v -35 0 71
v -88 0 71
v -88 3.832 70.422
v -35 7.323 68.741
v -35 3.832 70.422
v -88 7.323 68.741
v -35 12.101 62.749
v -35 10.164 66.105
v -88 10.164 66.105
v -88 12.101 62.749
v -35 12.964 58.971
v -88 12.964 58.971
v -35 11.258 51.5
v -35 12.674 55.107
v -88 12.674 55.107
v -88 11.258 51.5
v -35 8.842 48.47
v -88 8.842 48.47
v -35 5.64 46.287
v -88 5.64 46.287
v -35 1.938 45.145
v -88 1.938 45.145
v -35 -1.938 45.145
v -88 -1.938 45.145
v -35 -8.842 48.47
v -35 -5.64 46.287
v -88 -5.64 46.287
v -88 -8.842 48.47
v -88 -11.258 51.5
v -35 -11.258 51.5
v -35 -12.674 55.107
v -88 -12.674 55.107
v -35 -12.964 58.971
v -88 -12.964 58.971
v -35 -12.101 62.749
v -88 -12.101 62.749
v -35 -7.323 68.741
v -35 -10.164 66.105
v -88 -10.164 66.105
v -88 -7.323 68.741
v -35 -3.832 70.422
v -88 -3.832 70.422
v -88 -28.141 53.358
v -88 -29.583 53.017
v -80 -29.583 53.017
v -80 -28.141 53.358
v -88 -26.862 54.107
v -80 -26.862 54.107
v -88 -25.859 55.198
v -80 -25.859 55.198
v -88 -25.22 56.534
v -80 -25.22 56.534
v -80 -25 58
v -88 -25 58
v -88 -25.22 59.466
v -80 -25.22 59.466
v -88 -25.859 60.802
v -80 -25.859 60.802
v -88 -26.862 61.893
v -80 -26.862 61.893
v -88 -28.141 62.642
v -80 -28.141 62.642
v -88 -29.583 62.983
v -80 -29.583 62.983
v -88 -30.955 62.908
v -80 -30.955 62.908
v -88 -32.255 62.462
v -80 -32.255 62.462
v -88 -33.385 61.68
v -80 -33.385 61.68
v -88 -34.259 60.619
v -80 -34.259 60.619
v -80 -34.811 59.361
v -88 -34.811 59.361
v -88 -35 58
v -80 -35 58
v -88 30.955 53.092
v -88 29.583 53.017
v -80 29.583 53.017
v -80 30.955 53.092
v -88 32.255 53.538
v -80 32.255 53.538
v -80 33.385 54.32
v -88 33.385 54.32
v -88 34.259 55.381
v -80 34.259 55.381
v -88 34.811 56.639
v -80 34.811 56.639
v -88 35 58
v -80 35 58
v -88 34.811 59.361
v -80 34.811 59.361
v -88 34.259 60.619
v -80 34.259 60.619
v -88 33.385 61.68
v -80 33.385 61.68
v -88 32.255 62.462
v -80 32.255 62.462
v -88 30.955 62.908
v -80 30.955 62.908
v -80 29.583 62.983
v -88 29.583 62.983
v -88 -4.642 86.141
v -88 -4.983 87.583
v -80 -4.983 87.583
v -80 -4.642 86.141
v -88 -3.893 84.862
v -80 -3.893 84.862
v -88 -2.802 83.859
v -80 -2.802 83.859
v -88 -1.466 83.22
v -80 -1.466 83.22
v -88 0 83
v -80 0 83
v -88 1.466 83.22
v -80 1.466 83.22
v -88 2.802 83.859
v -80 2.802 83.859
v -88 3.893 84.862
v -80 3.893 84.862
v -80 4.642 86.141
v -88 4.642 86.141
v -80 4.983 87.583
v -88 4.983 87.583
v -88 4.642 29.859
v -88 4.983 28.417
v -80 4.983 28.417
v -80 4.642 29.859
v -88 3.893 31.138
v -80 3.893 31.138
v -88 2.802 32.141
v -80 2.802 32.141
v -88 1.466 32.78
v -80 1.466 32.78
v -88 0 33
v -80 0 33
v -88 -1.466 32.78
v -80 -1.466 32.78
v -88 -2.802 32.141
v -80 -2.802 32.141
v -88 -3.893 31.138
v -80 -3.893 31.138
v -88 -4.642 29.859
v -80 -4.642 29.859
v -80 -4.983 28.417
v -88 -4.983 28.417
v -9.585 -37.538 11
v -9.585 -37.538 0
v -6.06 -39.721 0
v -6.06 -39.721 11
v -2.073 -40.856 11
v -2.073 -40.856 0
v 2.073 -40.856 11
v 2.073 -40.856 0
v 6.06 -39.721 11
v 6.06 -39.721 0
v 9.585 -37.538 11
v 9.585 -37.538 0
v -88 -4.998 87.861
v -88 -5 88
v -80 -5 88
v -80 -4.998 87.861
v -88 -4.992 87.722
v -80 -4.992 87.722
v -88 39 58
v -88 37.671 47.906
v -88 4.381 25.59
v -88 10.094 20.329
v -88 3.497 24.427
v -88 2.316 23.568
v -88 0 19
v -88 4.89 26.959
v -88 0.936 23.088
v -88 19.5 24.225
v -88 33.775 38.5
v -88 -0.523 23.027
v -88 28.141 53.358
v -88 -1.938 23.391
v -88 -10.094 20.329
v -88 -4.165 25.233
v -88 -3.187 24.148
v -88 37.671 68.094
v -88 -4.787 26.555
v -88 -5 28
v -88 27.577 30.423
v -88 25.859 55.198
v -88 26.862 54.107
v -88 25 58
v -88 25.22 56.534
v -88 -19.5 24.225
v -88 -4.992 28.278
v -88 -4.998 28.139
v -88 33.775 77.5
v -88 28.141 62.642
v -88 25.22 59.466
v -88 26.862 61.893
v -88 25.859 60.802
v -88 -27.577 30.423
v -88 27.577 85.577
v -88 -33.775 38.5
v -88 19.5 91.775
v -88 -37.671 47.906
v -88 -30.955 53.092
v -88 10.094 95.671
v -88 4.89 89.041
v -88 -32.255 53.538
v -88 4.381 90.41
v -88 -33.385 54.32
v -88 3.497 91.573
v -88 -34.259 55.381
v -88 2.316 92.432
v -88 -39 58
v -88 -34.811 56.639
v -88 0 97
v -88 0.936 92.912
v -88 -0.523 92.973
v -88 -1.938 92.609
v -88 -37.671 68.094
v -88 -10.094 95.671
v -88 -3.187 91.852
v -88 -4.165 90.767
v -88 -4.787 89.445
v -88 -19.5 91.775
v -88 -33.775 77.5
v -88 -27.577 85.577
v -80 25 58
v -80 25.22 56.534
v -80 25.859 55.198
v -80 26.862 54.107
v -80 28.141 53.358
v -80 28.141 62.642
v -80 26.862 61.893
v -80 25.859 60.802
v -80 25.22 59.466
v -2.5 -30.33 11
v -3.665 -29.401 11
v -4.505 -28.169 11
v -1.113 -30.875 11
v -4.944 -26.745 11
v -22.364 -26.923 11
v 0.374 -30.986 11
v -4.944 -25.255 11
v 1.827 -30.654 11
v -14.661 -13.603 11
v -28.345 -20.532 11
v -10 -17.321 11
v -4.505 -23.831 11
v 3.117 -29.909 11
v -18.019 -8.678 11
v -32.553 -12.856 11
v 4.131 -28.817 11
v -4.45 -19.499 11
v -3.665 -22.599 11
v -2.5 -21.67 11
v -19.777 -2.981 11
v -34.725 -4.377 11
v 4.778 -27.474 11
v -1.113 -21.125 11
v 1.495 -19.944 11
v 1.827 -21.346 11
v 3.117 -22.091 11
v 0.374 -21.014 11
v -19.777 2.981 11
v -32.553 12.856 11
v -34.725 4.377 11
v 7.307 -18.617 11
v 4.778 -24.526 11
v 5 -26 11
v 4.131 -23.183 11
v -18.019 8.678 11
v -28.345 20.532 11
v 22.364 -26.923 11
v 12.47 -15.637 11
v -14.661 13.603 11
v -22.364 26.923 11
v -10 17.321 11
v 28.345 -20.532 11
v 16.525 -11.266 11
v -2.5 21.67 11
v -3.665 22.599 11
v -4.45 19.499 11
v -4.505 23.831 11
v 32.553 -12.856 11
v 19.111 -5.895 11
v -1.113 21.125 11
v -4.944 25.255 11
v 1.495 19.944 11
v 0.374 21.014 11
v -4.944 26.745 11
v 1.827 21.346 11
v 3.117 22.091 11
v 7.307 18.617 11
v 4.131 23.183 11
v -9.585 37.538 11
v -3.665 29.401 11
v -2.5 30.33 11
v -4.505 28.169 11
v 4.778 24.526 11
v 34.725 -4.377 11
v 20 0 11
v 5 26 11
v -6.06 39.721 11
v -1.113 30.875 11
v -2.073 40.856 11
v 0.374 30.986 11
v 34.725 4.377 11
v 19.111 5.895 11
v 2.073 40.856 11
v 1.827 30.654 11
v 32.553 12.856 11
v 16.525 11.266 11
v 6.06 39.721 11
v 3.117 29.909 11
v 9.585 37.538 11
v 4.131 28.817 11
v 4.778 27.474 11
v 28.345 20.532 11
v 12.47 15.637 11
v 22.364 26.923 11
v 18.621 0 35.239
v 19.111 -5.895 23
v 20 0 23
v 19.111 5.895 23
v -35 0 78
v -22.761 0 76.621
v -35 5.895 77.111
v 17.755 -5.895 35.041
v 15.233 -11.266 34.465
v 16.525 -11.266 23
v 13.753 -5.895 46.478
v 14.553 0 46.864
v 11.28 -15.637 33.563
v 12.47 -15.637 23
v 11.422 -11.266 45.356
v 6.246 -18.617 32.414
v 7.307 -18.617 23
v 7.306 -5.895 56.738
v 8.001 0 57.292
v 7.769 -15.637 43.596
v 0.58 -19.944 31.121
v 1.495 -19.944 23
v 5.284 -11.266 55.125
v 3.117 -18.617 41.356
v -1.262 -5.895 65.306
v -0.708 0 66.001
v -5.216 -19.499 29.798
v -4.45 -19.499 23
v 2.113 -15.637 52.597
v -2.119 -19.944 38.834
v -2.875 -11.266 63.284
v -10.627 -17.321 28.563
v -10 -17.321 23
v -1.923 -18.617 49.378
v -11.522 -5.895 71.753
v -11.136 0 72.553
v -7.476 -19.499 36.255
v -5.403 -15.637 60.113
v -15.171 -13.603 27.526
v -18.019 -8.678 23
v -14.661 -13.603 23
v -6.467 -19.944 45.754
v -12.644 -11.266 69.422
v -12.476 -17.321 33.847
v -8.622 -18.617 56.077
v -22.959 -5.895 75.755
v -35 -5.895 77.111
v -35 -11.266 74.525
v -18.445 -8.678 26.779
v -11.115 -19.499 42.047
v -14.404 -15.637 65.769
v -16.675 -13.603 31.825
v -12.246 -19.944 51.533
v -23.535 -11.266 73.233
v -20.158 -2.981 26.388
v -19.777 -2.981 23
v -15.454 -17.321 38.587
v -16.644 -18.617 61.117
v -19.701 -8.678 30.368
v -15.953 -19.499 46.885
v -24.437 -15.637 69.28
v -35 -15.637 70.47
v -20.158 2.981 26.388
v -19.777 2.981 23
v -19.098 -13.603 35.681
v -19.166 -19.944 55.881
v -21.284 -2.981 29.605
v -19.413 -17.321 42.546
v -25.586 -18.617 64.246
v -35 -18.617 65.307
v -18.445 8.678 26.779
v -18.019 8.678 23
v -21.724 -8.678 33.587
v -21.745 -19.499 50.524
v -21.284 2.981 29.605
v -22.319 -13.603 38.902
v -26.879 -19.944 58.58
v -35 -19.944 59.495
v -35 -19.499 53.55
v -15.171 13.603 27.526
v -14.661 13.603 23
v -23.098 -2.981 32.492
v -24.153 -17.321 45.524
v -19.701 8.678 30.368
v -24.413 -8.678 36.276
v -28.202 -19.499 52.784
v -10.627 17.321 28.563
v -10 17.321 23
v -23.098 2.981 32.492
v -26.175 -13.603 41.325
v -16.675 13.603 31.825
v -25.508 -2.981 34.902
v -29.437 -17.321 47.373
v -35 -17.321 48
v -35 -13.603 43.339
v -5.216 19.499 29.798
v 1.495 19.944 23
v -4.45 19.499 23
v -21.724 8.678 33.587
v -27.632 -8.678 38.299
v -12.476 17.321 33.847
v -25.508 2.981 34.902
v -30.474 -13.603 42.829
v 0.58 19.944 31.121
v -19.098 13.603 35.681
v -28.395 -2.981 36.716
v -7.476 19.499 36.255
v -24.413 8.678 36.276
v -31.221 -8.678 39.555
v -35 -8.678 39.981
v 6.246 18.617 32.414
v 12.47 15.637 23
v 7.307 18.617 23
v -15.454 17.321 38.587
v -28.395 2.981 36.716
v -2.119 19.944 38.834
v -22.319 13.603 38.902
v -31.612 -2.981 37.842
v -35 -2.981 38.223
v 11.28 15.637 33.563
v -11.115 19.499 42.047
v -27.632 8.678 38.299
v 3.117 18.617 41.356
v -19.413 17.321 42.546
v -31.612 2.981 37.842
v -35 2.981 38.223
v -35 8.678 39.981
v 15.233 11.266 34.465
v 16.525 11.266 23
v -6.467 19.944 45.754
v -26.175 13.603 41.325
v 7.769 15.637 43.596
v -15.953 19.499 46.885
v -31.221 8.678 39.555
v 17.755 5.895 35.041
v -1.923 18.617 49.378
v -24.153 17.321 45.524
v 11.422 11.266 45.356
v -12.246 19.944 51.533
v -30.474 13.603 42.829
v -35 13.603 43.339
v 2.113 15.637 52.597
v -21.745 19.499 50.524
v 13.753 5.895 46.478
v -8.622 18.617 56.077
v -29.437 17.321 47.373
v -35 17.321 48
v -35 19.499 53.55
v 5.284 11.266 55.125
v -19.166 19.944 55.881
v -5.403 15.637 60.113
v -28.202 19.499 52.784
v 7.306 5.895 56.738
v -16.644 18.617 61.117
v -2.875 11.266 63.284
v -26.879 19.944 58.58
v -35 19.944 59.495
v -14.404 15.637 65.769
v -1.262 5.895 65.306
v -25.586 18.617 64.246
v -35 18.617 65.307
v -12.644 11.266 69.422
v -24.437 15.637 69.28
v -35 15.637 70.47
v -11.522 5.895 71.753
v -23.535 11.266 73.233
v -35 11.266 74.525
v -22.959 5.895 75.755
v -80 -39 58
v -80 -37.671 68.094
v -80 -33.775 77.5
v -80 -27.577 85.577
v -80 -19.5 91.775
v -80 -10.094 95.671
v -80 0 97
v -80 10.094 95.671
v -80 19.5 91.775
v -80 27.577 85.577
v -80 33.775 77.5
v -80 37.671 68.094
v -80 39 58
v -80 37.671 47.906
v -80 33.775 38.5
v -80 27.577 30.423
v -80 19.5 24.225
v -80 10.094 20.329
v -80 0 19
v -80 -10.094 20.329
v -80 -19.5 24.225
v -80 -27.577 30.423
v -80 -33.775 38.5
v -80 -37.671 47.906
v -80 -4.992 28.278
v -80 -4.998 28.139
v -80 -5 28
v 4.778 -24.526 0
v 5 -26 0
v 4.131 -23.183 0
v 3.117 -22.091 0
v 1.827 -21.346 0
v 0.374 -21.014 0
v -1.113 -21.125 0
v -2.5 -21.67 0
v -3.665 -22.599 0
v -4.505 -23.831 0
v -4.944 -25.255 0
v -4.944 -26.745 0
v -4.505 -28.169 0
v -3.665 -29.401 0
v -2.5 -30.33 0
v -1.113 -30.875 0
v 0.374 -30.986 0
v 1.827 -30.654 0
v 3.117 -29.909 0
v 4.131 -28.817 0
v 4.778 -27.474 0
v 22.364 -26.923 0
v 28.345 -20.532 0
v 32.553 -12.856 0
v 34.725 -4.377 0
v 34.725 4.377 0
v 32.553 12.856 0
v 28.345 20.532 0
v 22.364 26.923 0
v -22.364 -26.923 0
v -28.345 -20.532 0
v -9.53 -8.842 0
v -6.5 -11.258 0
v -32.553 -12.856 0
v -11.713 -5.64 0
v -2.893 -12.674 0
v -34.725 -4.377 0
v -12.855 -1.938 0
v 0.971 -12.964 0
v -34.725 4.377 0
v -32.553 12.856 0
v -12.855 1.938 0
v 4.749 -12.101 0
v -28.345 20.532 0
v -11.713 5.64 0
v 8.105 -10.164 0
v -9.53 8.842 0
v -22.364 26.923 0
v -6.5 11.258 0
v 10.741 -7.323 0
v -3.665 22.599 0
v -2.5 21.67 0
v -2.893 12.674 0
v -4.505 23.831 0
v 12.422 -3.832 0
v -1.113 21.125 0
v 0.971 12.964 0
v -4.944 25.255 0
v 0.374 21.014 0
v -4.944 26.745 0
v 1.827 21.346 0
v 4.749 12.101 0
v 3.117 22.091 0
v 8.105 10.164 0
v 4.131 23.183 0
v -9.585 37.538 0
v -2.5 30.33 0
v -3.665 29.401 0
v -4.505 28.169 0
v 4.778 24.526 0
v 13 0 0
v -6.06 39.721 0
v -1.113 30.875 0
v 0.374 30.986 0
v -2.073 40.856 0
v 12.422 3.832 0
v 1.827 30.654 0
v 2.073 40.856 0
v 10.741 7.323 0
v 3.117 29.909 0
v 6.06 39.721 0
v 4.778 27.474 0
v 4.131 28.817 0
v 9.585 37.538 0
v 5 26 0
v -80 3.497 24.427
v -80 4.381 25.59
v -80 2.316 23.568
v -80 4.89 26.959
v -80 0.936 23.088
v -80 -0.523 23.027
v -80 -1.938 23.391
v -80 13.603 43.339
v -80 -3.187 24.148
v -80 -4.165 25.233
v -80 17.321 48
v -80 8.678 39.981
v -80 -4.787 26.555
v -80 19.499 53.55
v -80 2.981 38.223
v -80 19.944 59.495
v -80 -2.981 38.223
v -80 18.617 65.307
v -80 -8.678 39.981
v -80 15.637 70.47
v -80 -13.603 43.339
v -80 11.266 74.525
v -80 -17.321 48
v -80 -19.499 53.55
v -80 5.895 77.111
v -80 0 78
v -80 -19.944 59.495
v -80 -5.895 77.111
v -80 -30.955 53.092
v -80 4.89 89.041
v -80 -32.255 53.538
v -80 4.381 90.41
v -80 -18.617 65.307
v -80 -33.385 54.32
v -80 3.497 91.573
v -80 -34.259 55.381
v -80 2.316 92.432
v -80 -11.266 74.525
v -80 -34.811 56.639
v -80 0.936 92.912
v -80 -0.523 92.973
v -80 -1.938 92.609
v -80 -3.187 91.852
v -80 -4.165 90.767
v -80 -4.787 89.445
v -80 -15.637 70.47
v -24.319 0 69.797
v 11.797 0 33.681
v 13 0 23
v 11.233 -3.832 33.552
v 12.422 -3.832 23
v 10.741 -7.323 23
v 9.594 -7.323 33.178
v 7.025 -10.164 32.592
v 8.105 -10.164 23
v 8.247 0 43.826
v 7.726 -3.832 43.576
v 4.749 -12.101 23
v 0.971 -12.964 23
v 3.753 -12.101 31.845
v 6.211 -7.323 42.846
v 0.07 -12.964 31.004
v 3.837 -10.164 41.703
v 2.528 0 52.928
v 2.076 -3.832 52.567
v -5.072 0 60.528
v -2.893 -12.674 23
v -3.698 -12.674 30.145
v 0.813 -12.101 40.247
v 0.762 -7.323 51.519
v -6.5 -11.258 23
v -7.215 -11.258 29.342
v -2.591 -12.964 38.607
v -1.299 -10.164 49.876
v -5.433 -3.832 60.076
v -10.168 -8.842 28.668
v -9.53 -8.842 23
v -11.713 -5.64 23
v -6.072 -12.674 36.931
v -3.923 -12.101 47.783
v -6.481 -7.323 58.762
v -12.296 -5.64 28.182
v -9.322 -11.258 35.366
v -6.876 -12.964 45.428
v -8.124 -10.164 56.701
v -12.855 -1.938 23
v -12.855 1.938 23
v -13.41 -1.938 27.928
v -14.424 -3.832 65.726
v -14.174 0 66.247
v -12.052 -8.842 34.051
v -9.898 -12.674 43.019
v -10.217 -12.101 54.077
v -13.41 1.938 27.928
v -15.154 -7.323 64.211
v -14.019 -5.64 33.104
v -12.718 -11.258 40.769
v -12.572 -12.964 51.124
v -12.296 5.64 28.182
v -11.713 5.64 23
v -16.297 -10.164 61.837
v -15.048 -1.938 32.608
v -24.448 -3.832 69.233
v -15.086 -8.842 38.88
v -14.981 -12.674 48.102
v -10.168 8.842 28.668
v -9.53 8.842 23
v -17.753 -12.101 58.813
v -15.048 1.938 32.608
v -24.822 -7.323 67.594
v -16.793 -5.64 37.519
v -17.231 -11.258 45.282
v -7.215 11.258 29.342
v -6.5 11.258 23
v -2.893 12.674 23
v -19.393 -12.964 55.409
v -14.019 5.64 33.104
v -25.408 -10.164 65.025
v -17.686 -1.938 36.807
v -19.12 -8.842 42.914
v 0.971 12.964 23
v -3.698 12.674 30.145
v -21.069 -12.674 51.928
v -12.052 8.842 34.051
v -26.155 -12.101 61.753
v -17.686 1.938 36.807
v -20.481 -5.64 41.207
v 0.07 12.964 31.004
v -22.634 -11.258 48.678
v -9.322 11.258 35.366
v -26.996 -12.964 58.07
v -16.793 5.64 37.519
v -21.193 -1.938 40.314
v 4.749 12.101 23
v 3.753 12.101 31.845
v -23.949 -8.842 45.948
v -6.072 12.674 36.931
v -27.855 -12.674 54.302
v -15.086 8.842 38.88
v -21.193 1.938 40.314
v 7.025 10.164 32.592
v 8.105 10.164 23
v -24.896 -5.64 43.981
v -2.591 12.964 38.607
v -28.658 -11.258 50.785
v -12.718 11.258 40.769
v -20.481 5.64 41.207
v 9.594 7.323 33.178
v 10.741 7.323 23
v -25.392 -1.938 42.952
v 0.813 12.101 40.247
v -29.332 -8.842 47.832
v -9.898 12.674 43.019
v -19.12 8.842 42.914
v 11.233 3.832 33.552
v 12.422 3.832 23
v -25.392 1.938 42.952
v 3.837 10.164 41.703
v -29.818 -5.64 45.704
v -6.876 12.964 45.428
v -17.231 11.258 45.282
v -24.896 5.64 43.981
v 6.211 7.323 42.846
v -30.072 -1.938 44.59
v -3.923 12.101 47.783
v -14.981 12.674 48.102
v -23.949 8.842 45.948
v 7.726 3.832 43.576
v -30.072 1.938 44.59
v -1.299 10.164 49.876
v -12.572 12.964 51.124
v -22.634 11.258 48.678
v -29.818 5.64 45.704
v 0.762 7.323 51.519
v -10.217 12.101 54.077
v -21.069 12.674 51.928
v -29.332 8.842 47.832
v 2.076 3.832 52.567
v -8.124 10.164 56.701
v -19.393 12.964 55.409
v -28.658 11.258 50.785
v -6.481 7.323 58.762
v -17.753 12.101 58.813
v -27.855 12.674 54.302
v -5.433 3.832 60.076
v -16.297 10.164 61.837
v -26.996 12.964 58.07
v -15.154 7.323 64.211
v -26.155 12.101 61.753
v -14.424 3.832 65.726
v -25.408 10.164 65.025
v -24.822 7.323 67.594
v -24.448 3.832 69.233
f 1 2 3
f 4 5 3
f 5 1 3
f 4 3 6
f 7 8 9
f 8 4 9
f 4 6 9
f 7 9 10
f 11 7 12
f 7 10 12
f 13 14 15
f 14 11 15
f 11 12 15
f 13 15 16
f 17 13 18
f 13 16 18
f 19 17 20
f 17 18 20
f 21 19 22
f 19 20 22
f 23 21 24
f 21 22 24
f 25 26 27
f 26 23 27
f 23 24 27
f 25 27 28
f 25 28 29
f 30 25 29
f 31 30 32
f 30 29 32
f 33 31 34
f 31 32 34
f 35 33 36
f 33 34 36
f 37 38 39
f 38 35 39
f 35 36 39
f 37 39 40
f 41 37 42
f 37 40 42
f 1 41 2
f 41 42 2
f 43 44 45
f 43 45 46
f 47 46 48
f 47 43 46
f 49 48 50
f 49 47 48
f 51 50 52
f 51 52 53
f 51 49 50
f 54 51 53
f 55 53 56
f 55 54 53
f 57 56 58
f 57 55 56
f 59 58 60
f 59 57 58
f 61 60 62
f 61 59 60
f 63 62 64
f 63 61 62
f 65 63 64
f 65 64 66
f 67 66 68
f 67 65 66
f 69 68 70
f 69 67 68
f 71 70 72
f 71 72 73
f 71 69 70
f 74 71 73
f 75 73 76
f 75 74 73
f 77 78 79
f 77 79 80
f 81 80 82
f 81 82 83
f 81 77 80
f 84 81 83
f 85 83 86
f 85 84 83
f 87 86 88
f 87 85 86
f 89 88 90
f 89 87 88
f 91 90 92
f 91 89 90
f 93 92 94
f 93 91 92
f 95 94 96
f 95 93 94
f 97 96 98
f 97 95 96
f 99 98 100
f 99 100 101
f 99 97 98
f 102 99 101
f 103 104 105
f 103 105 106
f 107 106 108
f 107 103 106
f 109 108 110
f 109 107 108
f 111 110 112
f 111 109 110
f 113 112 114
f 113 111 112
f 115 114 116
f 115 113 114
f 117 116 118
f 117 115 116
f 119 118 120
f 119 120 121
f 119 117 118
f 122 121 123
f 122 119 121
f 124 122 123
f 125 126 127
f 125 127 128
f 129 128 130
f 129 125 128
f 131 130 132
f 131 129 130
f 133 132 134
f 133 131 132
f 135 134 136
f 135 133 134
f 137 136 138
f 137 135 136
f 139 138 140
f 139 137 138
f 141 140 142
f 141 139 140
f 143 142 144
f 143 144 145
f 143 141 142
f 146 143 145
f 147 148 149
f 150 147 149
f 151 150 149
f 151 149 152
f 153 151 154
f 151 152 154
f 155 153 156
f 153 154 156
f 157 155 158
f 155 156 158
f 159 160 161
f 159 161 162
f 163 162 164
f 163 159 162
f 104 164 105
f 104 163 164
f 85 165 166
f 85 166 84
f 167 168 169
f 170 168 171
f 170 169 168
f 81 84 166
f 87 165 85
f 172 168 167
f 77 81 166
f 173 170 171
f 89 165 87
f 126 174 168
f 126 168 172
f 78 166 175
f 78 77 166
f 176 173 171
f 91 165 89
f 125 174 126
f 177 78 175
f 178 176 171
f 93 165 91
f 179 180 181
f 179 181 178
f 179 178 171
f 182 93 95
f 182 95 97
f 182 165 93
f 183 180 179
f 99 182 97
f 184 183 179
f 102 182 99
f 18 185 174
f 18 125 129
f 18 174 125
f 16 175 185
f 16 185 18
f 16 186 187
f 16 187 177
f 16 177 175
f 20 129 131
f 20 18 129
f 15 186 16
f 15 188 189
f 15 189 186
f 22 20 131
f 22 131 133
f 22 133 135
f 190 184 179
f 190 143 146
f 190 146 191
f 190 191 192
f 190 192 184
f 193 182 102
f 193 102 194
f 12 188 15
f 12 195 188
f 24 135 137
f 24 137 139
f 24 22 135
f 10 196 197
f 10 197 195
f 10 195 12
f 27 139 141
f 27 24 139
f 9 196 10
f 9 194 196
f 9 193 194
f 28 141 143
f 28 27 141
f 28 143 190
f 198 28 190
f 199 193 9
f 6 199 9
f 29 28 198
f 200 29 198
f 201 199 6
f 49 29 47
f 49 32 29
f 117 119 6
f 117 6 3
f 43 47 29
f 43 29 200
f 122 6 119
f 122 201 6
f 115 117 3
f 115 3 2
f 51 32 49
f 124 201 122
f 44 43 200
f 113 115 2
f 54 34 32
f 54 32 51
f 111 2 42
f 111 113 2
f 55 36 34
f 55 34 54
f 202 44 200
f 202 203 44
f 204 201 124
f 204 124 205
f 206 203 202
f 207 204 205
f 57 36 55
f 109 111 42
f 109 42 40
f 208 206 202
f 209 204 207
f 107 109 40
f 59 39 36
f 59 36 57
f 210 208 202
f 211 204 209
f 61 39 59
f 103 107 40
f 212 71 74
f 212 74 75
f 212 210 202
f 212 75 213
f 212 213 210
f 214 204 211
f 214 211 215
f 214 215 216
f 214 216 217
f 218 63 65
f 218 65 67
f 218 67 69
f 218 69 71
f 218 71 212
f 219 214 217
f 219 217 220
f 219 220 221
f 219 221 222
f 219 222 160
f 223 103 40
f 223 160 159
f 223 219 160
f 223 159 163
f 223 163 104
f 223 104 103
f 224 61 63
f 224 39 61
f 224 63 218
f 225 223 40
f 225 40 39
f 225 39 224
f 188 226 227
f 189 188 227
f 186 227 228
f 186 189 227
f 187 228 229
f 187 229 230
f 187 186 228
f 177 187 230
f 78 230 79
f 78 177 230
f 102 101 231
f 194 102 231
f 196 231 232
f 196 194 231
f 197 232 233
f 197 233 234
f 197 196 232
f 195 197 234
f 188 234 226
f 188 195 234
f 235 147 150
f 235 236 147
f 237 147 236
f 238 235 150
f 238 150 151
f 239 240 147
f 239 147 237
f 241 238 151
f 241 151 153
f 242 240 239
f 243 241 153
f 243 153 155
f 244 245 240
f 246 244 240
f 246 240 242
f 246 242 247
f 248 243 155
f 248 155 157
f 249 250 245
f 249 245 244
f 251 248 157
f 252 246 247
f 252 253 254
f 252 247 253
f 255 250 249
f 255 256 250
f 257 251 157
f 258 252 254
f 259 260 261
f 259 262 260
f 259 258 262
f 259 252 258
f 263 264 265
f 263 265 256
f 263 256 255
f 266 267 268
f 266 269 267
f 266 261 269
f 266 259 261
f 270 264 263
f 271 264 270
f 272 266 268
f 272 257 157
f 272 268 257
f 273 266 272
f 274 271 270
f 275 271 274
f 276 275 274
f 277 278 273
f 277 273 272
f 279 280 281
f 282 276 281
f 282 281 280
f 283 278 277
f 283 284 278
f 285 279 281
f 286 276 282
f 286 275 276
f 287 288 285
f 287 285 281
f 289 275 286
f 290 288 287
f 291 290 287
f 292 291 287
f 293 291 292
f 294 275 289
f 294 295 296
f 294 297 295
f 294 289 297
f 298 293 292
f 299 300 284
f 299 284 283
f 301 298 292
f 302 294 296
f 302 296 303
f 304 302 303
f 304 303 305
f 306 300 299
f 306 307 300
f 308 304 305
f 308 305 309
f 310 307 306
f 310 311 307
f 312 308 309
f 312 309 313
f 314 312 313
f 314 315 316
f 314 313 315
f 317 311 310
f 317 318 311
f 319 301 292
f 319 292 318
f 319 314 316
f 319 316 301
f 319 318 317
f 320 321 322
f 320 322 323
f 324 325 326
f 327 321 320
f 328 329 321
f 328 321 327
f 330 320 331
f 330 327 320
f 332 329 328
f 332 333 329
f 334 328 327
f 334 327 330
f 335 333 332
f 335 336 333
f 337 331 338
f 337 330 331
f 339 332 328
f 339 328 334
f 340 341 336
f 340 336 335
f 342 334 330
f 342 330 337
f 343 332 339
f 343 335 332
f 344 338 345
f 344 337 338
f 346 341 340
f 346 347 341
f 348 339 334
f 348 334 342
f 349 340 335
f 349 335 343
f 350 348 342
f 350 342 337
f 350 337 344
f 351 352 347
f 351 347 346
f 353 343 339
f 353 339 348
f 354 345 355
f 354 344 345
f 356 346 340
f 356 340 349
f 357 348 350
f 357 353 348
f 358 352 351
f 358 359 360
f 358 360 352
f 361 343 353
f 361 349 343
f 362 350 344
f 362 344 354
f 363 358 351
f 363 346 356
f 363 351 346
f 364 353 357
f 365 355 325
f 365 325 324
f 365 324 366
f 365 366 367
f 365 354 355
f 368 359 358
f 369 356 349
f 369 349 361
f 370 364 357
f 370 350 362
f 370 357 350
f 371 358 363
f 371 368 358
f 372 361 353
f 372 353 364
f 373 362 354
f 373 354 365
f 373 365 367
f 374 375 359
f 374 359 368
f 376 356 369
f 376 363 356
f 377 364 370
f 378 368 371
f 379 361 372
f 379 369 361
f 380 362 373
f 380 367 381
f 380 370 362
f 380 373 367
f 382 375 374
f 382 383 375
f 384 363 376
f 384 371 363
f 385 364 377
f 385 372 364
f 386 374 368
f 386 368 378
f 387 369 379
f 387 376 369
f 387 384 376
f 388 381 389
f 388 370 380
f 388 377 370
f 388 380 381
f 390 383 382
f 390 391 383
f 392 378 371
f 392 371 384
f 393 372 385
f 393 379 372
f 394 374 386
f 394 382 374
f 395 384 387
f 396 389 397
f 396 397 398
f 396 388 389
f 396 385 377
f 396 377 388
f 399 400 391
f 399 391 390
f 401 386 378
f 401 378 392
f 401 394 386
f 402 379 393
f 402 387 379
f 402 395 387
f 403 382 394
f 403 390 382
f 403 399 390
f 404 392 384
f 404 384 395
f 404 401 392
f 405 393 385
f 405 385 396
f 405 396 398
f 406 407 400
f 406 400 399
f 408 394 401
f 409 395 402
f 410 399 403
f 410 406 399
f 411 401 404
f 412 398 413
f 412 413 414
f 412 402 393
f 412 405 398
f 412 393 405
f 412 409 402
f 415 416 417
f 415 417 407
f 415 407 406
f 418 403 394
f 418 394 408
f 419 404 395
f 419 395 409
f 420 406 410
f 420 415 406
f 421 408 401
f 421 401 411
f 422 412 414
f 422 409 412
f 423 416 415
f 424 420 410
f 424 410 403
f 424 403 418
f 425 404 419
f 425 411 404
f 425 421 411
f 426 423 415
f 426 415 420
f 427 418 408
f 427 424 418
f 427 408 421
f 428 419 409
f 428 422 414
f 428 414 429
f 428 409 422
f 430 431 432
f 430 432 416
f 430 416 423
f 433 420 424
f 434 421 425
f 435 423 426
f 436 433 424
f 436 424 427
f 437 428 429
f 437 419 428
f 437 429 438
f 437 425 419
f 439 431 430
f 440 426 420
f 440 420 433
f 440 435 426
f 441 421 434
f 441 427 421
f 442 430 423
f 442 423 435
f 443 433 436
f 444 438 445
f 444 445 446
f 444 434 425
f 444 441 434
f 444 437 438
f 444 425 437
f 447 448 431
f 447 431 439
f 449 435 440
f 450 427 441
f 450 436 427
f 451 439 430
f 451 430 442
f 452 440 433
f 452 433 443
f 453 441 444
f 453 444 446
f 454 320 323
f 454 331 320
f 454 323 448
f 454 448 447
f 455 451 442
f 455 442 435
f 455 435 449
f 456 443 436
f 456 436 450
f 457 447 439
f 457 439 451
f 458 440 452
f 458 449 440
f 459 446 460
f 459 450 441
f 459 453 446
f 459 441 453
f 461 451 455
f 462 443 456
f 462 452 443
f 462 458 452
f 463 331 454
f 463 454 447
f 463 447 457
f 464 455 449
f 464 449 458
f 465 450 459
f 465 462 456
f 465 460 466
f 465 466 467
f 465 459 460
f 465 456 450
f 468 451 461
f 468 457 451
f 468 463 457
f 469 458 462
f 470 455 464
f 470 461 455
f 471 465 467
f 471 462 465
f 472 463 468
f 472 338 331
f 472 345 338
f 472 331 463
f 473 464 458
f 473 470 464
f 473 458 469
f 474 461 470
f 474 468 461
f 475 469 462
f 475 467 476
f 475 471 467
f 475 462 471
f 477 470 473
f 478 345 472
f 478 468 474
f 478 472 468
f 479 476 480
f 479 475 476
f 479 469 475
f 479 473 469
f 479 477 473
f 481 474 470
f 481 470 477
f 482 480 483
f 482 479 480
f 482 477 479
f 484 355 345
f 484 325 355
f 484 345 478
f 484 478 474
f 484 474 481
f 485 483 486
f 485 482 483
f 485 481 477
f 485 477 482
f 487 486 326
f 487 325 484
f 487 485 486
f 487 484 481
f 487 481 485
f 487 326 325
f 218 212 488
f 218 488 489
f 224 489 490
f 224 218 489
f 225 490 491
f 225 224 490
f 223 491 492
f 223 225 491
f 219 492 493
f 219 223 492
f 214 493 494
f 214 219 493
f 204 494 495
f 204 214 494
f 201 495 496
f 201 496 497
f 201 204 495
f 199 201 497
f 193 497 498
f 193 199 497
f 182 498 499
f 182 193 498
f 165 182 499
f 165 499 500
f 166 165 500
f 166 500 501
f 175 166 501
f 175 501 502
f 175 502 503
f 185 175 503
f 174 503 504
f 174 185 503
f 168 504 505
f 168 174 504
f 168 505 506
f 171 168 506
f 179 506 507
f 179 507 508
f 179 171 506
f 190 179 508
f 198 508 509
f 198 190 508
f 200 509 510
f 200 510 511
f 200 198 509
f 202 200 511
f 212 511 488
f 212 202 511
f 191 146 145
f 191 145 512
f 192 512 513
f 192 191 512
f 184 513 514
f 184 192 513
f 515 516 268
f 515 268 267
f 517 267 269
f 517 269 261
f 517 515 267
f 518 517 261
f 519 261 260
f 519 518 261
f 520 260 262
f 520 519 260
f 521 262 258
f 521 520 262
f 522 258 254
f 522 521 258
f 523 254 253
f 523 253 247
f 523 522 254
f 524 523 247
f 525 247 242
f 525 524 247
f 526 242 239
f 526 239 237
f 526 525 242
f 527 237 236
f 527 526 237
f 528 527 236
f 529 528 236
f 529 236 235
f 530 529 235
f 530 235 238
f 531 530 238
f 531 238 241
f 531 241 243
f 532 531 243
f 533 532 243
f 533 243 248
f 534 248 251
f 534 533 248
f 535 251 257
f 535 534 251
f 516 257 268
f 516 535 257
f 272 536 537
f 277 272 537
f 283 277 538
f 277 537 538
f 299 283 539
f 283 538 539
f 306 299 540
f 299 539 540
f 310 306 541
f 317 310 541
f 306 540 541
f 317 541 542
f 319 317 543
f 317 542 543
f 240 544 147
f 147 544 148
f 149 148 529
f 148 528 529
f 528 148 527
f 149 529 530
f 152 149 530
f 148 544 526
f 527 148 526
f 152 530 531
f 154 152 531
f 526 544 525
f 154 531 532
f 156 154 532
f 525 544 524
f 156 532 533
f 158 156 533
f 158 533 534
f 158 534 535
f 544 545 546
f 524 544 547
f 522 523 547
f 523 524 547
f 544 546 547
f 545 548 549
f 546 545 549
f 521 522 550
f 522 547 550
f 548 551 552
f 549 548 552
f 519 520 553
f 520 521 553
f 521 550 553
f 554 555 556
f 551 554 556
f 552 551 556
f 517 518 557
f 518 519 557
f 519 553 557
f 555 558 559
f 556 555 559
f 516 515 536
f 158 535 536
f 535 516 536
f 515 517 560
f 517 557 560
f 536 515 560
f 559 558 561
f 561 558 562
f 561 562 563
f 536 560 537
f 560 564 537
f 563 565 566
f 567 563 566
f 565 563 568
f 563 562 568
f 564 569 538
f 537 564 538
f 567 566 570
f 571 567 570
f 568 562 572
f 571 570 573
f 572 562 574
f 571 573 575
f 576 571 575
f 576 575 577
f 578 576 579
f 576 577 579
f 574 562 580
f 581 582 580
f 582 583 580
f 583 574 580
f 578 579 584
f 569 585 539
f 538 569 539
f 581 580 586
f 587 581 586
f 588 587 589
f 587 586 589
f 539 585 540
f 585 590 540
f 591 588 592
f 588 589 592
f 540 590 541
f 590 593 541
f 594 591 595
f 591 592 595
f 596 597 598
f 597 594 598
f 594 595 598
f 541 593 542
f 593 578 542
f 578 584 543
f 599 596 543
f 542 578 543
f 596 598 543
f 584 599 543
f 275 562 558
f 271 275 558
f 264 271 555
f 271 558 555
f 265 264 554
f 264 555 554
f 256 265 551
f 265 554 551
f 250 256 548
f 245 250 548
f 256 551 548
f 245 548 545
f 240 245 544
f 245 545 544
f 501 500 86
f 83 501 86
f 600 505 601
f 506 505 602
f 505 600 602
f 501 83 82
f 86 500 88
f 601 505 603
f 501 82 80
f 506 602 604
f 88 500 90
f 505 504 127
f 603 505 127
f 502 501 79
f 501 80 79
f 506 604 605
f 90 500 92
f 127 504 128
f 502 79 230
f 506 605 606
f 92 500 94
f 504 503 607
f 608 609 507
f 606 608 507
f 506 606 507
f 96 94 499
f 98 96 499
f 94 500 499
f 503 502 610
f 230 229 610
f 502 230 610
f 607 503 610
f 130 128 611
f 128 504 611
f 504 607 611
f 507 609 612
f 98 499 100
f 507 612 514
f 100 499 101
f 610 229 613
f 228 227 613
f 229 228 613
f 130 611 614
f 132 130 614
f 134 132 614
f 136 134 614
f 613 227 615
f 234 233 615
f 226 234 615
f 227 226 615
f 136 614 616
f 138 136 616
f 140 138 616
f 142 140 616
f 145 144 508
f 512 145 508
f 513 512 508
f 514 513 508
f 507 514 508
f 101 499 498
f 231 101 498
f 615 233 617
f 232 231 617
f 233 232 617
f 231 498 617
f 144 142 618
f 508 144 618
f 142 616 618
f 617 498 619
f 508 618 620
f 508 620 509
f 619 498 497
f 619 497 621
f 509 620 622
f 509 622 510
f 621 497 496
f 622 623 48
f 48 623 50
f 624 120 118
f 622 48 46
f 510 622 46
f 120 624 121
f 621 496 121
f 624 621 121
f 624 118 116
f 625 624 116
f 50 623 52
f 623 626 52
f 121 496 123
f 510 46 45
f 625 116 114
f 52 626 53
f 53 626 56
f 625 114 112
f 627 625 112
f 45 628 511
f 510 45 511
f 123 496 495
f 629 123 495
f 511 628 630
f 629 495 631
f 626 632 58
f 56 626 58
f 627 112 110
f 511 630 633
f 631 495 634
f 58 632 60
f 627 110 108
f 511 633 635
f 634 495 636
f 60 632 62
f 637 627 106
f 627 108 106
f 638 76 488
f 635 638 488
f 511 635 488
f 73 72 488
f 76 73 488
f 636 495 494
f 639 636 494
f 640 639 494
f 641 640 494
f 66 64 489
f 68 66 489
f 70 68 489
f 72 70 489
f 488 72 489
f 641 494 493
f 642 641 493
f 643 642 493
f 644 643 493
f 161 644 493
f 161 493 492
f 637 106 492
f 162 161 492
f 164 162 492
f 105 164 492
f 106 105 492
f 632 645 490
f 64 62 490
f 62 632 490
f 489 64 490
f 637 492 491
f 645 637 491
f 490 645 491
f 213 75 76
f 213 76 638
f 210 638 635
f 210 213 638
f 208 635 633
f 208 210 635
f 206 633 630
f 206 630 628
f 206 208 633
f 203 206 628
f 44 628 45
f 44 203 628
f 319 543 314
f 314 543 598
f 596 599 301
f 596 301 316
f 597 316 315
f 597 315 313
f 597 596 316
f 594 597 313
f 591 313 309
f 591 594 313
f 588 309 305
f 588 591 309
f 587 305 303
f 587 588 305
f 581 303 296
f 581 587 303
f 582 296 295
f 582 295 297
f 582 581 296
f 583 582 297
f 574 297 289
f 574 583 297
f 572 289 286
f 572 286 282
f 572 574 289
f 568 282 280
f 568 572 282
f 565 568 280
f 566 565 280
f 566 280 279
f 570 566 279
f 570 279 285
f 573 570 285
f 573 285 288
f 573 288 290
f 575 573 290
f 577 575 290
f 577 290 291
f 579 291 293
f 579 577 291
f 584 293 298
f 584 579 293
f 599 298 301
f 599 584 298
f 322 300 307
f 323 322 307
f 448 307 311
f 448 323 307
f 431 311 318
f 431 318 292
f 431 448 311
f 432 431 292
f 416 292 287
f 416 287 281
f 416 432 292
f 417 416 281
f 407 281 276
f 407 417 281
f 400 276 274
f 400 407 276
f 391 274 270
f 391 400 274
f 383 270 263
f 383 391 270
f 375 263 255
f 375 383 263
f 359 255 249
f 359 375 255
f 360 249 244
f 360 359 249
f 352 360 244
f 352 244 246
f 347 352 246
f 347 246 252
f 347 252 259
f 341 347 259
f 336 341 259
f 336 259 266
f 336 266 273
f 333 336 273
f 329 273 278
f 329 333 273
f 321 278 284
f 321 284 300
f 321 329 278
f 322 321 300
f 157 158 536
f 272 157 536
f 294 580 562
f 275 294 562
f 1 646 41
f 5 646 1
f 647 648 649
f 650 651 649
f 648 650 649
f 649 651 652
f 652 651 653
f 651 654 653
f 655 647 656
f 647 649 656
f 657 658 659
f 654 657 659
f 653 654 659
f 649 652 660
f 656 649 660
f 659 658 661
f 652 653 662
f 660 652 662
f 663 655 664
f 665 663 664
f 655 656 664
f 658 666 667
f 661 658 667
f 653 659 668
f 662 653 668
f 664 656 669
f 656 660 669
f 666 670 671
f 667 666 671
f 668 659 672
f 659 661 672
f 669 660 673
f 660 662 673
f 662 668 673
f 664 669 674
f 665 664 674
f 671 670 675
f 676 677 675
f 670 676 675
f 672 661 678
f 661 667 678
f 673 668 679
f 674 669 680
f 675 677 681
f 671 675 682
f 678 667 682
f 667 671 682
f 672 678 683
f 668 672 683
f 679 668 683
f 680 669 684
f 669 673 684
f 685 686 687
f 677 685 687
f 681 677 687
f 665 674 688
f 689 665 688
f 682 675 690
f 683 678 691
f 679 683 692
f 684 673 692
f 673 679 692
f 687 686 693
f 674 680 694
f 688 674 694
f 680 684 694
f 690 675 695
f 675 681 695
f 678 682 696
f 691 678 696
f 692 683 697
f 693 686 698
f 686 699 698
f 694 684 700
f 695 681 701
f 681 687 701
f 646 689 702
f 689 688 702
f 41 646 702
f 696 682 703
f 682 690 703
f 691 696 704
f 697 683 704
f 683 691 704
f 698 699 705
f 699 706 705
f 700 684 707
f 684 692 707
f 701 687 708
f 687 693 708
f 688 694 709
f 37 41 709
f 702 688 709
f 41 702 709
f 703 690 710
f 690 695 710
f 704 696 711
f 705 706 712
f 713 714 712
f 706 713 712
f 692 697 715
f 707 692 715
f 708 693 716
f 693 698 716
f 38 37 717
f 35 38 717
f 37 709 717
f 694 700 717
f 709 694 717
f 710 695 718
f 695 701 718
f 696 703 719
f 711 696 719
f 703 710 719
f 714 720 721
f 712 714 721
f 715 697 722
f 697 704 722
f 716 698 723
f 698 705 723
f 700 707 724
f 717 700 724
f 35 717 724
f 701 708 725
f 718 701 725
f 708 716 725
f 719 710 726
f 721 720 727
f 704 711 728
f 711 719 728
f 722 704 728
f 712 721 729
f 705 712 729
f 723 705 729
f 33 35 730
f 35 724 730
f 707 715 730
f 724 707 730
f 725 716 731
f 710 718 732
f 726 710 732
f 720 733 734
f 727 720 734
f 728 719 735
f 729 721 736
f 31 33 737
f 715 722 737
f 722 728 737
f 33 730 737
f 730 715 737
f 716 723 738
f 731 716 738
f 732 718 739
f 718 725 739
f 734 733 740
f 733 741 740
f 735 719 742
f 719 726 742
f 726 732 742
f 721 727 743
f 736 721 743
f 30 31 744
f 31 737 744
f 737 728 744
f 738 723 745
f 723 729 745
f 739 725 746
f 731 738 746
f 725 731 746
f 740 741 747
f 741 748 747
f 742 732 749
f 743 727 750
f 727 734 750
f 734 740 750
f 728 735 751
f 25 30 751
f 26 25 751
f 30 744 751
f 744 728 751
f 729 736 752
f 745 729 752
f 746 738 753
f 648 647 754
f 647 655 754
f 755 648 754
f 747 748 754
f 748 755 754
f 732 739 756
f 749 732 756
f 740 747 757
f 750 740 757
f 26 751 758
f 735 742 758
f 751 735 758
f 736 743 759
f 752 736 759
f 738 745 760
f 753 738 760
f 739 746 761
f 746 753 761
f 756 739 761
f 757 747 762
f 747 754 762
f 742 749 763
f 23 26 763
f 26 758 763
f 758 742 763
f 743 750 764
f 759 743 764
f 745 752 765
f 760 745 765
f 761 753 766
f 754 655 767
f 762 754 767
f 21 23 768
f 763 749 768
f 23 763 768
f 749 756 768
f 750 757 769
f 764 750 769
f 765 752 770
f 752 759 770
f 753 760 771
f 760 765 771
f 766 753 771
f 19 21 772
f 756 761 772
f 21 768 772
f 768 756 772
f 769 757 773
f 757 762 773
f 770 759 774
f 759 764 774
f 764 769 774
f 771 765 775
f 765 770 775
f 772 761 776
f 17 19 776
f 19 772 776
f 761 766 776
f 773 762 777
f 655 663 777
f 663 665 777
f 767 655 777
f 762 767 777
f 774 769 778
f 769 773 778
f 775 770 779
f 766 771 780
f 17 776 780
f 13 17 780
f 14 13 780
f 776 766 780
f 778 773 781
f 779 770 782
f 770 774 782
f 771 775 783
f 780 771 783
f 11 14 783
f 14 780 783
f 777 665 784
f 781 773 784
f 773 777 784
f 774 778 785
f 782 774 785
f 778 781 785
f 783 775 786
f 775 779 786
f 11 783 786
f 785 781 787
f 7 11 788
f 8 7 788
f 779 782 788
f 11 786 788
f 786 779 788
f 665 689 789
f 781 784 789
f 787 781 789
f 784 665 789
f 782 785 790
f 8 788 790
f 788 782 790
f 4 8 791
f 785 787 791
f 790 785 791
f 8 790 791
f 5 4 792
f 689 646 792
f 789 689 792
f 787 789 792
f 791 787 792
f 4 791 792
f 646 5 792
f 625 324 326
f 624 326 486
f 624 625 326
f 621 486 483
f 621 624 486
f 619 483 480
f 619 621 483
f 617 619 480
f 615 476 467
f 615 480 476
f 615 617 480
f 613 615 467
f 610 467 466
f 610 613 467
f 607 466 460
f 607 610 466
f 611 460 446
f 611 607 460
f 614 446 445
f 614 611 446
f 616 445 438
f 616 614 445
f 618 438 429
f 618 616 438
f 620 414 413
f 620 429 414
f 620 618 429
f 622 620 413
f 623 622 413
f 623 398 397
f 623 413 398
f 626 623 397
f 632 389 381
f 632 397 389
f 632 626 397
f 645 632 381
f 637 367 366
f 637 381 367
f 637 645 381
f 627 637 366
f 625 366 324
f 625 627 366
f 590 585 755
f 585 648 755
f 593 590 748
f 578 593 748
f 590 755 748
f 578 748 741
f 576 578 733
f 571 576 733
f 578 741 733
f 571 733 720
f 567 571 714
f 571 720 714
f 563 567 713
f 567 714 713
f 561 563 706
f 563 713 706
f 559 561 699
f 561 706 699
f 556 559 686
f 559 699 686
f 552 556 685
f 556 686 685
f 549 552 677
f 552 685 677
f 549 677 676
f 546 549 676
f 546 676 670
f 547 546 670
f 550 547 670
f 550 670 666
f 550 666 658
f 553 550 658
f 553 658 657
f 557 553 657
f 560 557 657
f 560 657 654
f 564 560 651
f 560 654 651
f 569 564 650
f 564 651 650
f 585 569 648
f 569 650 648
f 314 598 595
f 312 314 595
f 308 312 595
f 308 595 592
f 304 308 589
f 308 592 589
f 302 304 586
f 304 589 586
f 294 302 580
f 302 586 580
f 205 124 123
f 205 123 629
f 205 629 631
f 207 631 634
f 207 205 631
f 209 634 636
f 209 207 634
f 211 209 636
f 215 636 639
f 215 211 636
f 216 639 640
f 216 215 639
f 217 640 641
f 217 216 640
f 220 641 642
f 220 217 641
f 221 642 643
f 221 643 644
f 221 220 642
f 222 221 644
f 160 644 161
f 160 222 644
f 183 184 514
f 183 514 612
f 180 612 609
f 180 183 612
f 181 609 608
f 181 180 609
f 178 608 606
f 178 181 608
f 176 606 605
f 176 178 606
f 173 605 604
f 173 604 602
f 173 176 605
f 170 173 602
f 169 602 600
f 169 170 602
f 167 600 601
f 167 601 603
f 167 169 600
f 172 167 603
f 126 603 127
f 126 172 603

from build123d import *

# Parameters (mm, degrees)
F0_R     = 20
F0_R_2   = 13
F3_R     = 39
F3_R_2   = 20
F3_R_3   = 13
F4_DEPTH = 8
F5_R     = 5
F5_R_2   = 13
F6_DEPTH = 11


with BuildPart() as f2:
    # F2: sweep along a path in F1
    with BuildLine(Plane.XZ) as f2_path:
        Line((0, 0), (0, 23))
        ThreePointArc((0, 23), (-10.2512626585, 47.7487373415), (-35, 58))
        Line((-35, 58), (-88, 58))
    # F0 (on Top) → F2 (sweep)
    with BuildSketch(Plane.XY):
        Circle(F0_R)
        Circle(F0_R_2, mode=Mode.SUBTRACT)
    sweep(path=f2_path.line)

    # F3 (on face) → F4 (join)
    with BuildSketch(Plane(origin=(-88, 0, 0), x_dir=(0, -1, 0), z_dir=(-1, 0, 0))):
        with Locations((0, 58)):
            Circle(F3_R)
        with BuildLine():
            ThreePointArc((4.982608643, 87.5833333333), (21.2132034356, 79.2132034356), (29.5833333333, 62.982608643))
            ThreePointArc((29.5833333333, 62.982608643), (33.3850160019, 61.679900361), (35, 58))
            ThreePointArc((35, 58), (33.3850160019, 54.320099639), (29.5833333333, 53.017391357))
            ThreePointArc((29.5833333333, 53.017391357), (21.2132034356, 36.7867965644), (4.982608643, 28.4166666667))
            ThreePointArc((4.982608643, 28.4166666667), (4.9956502687, 28.2085147299), (5, 28))
            ThreePointArc((5, 28), (-0.2085147299, 23.0043497313), (-4.982608643, 28.4166666667))
            ThreePointArc((-4.982608643, 28.4166666667), (-21.2132034356, 36.7867965644), (-29.5833333333, 53.017391357))
            ThreePointArc((-29.5833333333, 53.017391357), (-35, 58), (-29.5833333333, 62.982608643))
            ThreePointArc((-29.5833333333, 62.982608643), (-21.2132034356, 79.2132034356), (-4.982608643, 87.5833333333))
            ThreePointArc((-4.982608643, 87.5833333333), (-0.2085147299, 92.9956502687), (5, 88))
            ThreePointArc((5, 88), (4.9956502687, 87.7914852701), (4.982608643, 87.5833333333))
        make_face(mode=Mode.SUBTRACT)
        with BuildLine():
            ThreePointArc((29.5833333333, 53.017391357), (25, 58), (29.5833333333, 62.982608643))
            ThreePointArc((29.5833333333, 62.982608643), (21.2132034356, 79.2132034356), (4.982608643, 87.5833333333))
            ThreePointArc((4.982608643, 87.5833333333), (0, 83), (-4.982608643, 87.5833333333))
            ThreePointArc((-4.982608643, 87.5833333333), (-21.2132034356, 79.2132034356), (-29.5833333333, 62.982608643))
            ThreePointArc((-29.5833333333, 62.982608643), (-26.320099639, 61.3850160019), (-25, 58))
            ThreePointArc((-25, 58), (-26.320099639, 54.6149839981), (-29.5833333333, 53.017391357))
            ThreePointArc((-29.5833333333, 53.017391357), (-21.2132034356, 36.7867965644), (-4.982608643, 28.4166666667))
            ThreePointArc((-4.982608643, 28.4166666667), (0, 33), (4.982608643, 28.4166666667))
            ThreePointArc((4.982608643, 28.4166666667), (21.2132034356, 36.7867965644), (29.5833333333, 53.017391357))
        make_face()
        with Locations((0, 58)):
            Circle(F3_R_2, mode=Mode.SUBTRACT)
        with Locations((0, 58)):
            Circle(F3_R_2)
        with Locations((0, 58)):
            Circle(F3_R_3, mode=Mode.SUBTRACT)
    extrude(amount=-F4_DEPTH)

    # F5 (on Top) → F6 (join)
    with BuildSketch(Plane.XY):
        with BuildLine():
            Line((22.3639873232, 26.9230769231), (9.5845659957, 37.5384615385))
            ThreePointArc((9.5845659957, 37.5384615385), (0, 41), (-9.5845659957, 37.5384615385))
            Line((-9.5845659957, 37.5384615385), (-22.3639873232, 26.9230769231))
            ThreePointArc((-22.3639873232, 26.9230769231), (-35, 0), (-22.3639873232, -26.9230769231))
            Line((-22.3639873232, -26.9230769231), (-9.5845659957, -37.5384615385))
            ThreePointArc((-9.5845659957, -37.5384615385), (0, -41), (9.5845659957, -37.5384615385))
            Line((9.5845659957, -37.5384615385), (22.3639873232, -26.9230769231))
            ThreePointArc((22.3639873232, -26.9230769231), (35, 0), (22.3639873232, 26.9230769231))
        make_face()
        with Locations((0, -26)):
            Circle(F5_R, mode=Mode.SUBTRACT)
        Circle(F5_R_2, mode=Mode.SUBTRACT)
        with Locations((0, 26)):
            Circle(F5_R, mode=Mode.SUBTRACT)
    extrude(amount=F6_DEPTH)


solid = f2.part
